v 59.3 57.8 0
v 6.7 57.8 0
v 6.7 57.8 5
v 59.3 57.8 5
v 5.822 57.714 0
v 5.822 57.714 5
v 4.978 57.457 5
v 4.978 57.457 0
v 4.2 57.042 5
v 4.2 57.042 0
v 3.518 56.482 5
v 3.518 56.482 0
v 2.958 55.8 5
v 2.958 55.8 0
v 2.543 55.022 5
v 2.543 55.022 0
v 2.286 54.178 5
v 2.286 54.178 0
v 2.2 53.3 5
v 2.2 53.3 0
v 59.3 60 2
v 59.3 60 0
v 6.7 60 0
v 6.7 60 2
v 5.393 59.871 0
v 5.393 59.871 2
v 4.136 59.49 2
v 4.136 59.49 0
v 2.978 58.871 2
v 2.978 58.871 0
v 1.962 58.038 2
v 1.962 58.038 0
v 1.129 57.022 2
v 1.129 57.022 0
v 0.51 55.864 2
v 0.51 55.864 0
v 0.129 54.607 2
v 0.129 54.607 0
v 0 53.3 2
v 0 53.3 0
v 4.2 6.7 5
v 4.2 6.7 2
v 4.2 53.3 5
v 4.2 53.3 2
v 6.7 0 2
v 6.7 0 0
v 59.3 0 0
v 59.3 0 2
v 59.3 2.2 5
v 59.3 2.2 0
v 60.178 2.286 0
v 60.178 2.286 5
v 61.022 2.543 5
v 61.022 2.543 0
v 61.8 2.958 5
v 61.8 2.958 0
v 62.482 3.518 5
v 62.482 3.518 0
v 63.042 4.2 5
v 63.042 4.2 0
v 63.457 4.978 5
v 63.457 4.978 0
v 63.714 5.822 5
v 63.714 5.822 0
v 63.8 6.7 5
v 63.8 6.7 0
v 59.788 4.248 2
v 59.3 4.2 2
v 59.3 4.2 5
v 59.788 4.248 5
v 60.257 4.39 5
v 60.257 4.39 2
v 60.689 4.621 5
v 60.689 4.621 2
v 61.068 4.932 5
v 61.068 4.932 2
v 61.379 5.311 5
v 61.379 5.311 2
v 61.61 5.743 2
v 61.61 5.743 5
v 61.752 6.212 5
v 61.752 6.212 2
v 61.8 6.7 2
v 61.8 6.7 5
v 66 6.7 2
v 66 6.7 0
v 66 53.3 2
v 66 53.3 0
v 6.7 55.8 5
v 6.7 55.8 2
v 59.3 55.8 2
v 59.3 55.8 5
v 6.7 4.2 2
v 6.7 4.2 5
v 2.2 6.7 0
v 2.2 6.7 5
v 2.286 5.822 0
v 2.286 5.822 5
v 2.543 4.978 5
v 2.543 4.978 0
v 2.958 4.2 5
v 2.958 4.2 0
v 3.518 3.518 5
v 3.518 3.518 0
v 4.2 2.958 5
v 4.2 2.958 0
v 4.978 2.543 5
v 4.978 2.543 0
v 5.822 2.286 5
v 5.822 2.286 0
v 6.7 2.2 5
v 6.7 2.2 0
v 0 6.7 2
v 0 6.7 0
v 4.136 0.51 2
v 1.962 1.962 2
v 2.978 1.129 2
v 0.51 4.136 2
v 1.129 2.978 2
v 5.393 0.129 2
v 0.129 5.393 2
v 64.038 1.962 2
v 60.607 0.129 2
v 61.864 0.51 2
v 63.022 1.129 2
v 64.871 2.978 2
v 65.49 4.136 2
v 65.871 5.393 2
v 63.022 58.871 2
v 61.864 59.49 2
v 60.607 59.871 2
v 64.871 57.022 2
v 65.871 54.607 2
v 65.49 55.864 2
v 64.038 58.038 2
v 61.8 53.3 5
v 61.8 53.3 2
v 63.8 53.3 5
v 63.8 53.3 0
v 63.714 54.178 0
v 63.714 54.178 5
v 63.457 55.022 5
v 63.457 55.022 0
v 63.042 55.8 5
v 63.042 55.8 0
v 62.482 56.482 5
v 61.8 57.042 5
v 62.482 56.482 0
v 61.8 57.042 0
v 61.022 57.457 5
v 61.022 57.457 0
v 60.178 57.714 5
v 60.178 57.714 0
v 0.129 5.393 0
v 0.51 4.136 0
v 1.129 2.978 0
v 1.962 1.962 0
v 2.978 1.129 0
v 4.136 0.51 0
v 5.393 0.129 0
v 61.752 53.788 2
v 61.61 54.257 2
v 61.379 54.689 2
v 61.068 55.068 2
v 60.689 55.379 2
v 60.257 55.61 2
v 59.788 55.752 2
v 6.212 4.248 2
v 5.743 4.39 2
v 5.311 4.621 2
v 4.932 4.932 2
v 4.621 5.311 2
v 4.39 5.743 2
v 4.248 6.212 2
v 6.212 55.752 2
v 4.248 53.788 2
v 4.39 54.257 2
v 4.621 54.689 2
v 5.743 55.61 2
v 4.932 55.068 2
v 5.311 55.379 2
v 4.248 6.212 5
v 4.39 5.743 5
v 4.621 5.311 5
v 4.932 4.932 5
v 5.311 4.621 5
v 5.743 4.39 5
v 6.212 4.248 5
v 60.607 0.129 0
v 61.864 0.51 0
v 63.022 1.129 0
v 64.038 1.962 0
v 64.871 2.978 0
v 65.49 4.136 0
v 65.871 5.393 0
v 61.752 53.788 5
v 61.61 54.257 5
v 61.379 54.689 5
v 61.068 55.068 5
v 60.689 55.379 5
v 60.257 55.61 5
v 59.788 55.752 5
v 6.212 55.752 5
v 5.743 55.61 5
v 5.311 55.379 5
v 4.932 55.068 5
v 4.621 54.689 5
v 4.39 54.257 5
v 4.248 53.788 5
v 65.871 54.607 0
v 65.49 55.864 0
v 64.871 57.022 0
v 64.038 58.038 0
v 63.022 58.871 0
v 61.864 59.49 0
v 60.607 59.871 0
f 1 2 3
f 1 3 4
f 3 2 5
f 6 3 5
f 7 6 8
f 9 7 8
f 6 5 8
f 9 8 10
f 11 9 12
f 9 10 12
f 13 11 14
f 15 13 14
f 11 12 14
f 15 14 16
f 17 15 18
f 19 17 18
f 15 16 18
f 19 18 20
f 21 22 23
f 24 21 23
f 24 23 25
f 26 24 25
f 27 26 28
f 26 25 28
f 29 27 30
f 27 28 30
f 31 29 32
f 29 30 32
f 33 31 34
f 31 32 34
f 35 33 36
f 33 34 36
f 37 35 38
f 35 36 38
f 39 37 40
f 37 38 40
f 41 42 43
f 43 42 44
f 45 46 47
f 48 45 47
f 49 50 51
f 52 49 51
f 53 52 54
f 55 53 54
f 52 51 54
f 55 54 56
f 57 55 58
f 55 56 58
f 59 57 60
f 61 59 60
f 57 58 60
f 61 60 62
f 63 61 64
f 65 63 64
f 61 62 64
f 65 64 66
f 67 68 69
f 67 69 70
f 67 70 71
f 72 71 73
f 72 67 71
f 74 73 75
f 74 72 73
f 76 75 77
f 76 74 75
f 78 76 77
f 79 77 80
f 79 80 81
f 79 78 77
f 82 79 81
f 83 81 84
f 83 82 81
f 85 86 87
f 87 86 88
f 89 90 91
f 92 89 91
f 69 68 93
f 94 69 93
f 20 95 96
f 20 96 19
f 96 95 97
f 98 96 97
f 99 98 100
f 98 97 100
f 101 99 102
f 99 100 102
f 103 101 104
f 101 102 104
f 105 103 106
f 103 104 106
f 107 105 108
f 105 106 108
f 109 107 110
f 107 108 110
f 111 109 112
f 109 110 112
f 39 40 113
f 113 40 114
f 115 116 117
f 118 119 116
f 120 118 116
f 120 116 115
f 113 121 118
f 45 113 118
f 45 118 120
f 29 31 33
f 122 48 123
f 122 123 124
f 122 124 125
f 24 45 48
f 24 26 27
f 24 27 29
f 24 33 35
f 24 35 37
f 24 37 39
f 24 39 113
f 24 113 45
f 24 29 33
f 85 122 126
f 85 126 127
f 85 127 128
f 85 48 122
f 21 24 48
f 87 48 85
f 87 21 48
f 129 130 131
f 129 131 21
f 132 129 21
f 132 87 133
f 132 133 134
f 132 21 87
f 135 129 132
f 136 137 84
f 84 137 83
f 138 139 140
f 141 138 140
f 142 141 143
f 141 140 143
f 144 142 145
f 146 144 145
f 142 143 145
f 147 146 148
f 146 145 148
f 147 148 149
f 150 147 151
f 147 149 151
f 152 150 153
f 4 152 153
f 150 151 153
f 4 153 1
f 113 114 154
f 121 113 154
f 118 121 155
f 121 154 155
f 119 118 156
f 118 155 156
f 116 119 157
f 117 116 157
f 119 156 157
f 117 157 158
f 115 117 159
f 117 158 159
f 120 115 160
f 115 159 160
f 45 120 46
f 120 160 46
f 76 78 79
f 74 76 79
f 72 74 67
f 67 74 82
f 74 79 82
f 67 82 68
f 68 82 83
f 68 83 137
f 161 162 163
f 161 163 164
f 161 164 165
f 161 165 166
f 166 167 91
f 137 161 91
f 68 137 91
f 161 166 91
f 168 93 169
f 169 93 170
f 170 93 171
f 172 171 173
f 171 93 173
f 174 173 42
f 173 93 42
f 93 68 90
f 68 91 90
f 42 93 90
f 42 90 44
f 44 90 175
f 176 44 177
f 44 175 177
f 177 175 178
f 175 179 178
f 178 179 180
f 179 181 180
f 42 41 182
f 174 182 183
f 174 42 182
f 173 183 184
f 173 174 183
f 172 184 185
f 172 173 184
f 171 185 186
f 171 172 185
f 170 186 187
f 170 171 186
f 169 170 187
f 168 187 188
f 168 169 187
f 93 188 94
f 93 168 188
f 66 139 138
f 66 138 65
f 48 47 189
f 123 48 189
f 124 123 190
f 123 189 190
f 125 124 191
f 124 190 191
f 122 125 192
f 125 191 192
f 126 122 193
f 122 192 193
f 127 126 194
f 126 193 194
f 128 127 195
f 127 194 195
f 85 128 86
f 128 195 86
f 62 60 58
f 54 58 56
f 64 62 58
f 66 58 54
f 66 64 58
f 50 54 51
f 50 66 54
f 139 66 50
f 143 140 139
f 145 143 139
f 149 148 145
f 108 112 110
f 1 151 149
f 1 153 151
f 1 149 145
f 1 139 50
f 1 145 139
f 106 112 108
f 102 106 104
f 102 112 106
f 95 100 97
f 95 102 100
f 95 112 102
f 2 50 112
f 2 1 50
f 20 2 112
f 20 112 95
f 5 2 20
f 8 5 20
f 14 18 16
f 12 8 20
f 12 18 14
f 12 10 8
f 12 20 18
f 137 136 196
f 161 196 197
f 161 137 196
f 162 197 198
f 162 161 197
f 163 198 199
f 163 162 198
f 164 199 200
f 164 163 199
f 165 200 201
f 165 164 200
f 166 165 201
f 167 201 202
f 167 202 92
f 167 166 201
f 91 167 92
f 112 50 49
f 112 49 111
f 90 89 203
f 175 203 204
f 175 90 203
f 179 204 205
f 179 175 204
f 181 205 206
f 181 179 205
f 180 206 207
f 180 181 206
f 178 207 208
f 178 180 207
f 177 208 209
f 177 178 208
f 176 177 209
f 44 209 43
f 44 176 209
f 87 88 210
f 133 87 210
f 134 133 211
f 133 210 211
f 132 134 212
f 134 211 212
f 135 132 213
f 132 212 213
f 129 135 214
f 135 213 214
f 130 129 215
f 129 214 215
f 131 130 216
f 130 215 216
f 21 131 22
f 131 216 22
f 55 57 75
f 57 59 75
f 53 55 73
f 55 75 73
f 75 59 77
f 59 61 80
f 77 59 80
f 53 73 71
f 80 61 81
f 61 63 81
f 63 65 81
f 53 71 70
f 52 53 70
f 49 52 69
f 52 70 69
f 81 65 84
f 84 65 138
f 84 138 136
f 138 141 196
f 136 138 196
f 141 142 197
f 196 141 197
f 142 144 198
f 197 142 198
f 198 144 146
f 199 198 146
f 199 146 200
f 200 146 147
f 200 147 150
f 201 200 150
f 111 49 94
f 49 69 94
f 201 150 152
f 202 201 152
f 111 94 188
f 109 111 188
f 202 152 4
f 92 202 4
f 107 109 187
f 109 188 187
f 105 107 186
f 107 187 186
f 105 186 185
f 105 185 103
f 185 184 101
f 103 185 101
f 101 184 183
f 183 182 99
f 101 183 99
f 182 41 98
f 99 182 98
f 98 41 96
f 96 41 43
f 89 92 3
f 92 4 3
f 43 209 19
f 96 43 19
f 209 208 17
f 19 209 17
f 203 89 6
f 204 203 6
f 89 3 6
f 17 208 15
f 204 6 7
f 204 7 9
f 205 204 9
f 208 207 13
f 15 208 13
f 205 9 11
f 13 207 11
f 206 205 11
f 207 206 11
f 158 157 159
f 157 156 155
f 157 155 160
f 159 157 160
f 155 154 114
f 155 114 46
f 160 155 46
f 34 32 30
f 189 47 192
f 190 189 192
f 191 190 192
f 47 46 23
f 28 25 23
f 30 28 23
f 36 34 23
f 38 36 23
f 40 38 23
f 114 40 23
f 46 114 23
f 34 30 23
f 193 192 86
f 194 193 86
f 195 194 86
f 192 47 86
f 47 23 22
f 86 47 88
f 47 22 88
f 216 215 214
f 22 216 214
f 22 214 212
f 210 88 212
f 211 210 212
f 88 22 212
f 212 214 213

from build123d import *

# Parameters (mm, degrees)
EXTRUDE_DEPTH    = 2
EXTRUDE001_DEPTH = 5
THICKNESS_T      = -2


with BuildPart() as base:
    # Sketch → Extrude (new body)
    with BuildSketch(Plane.XY):
        with BuildLine():
            Line((6.7, 0), (59.3, 0))
            ThreePointArc((59.3, 0), (64.037615, 1.962385), (66, 6.7))
            Line((66, 6.7), (66, 53.3))
            ThreePointArc((66, 53.3), (64.037615, 58.037615), (59.3, 60))
            Line((59.3, 60), (6.7, 60))
            ThreePointArc((6.7, 60), (1.962385, 58.037615), (0, 53.3))
            Line((0, 53.3), (0, 6.7))
            ThreePointArc((0, 6.7), (1.962385, 1.962385), (6.7, 0))
        make_face()
    extrude(amount=EXTRUDE_DEPTH)


with BuildPart() as thickness:
    # Sketch001 → Extrude001 (new body)
    with BuildSketch(Plane.XY):
        with BuildLine():
            Line((6.7, 57.8), (59.3, 57.8))
            ThreePointArc((63.8, 53.3), (62.481981, 56.481981), (59.3, 57.8))
            Line((63.8, 53.3), (63.8, 6.7))
            ThreePointArc((59.3, 2.2), (62.481981, 3.518019), (63.8, 6.7))
            Line((59.3, 2.2), (6.7, 2.2))
            ThreePointArc((2.2, 6.7), (3.518019, 3.518019), (6.7, 2.2))
            Line((2.2, 6.7), (2.2, 53.3))
            ThreePointArc((6.7, 57.8), (3.518019, 56.481981), (2.2, 53.3))
        make_face()
    extrude(amount=EXTRUDE001_DEPTH)

    # Thickness
    thickness_openings = [thickness.faces().sort_by_distance(p)[0] for p in [
        (33, 30, 5),
    ]]
    offset(amount=THICKNESS_T, openings=thickness_openings)


solid = Compound([base.part, thickness.part])
